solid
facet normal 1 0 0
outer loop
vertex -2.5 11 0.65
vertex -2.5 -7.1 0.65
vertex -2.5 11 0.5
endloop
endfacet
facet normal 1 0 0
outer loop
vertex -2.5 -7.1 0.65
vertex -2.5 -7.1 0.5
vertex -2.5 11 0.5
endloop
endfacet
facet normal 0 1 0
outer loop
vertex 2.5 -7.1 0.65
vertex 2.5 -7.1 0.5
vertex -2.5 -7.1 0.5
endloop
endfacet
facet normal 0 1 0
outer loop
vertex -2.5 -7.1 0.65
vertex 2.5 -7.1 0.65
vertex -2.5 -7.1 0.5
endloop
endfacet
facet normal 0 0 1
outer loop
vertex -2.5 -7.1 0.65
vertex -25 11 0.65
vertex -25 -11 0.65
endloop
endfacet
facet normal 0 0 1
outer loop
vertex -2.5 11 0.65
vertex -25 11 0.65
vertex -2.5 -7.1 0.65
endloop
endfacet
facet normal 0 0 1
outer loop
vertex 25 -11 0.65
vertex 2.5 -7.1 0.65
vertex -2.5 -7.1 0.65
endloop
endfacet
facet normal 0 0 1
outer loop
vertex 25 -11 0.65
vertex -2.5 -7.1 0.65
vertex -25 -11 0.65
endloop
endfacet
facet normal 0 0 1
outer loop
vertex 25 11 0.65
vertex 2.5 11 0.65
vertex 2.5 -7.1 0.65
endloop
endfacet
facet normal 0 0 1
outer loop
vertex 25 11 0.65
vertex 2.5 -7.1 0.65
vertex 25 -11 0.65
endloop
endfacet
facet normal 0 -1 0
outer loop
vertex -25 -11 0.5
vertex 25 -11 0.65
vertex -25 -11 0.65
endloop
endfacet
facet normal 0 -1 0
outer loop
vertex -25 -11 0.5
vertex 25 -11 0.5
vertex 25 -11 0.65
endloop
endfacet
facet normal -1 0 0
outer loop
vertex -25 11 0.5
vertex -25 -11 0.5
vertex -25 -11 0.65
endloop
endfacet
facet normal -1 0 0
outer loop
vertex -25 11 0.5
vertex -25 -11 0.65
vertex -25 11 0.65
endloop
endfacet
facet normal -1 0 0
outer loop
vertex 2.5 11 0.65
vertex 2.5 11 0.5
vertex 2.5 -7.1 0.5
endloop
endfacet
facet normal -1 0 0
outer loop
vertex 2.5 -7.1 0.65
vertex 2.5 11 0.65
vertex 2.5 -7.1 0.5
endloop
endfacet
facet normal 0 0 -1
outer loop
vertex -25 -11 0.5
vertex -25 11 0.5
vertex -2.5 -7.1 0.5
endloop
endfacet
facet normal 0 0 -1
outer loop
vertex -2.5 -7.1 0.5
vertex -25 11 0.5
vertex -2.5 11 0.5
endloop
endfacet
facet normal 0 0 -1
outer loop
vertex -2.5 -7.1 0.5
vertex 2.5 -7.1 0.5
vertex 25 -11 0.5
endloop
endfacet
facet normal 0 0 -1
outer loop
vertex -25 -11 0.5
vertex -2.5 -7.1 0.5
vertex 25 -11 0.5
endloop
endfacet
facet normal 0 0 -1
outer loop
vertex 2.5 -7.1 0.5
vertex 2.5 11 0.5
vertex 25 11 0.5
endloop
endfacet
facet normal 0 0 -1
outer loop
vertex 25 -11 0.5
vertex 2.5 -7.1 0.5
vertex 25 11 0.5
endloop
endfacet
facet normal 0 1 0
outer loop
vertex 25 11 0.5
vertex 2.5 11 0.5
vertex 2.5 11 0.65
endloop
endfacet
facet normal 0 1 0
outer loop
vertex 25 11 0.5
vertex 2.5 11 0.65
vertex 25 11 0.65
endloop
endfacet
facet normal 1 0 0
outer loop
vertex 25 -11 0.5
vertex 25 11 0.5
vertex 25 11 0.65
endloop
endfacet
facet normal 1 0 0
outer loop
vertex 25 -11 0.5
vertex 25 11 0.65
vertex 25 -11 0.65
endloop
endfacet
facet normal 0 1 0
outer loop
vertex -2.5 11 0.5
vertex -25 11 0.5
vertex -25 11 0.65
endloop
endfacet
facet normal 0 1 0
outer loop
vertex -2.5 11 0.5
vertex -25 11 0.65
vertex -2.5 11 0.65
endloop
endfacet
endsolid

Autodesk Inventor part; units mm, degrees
ref_plane "YZ Plane" through (0, 0, 0) normal (1, 0, 0) x (0, 1, 0)
ref_plane "XZ Plane" through (0, 0, 0) normal (0, 1, 0) x (-1, 0, 0)
ref_plane "XY Plane" through (0, 0, 0) normal (0, 0, 1) x (1, 0, 0)
ref_plane "Arbeitsebene1" through (0, 0, 0.5) normal (0, 0, 1) x (1, 0, 0)
sketch "Skizze1" plane through (0, 0, 0.5) normal (0, 0, 1) x (1, 0, 0)
  circle A0 centre (12, 2.9) radius 1.5 projected
  circle A1 centre (-12, 2.9) radius 1.5 projected
  line L0 (2.5, 12.9) -> (2.5, -7.1) projected
  line L1 (2.5, -7.1) -> (2.25, -7.1) projected
  line L2 (2.25, -7.1) -> (2, -7.1) projected
  line L3 (2, -7.1) -> (1.75, -7.1) projected
  line L4 (1.75, -7.1) -> (1.5, -7.1) projected
  line L5 (1.5, -7.1) -> (1.25, -7.1) projected
  line L6 (1.25, -7.1) -> (1, -7.1) projected
  line L7 (1, -7.1) -> (0.75, -7.1) projected
  line L8 (0.75, -7.1) -> (0.5, -7.1) projected
  line L9 (0.5, -7.1) -> (0.25, -7.1) projected
  line L10 (0.25, -7.1) -> (0, -7.1) projected
  line L11 (0, -7.1) -> (-0.25, -7.1) projected
  line L12 (-0.25, -7.1) -> (-0.5, -7.1) projected
  line L13 (-0.5, -7.1) -> (-0.75, -7.1) projected
  line L14 (-0.75, -7.1) -> (-1, -7.1) projected
  line L15 (-1, -7.1) -> (-1.25, -7.1) projected
  line L16 (-1.25, -7.1) -> (-1.5, -7.1) projected
  line L17 (-1.5, -7.1) -> (-1.75, -7.1) projected
  line L18 (-1.75, -7.1) -> (-2, -7.1) projected
  line L19 (-2, -7.1) -> (-2.25, -7.1) projected
  line L20 (-2.25, -7.1) -> (-2.5, -7.1) projected
  line L21 (-2.5, -7.1) -> (-2.5, 12.9) projected
  line L22 (-2.5, 12.9) -> (-38, 12.9) projected
  line L23 (-38, 12.9) -> (-38, -12.9) projected
  line L24 (-38, -12.9) -> (38, -12.9) projected
  line L25 (38, -12.9) -> (38, 12.9) projected
  line L26 (38, 12.9) -> (2.5, 12.9) projected
  line L27 (25, -11) -> (-25, -11)
  line L28 (-25, -11) -> (-25, 11)
  line L29 (-25, 11) -> (25, 11)
  line L30 (25, 11) -> (25, -11)
  line L31 (25, -11) -> (-25, 11) construction
  line L32 (-25, -11) -> (25, 11) construction
  point P0 (0, 0)
  point P1 (-2.5, 11)
  point P2 (2.5, 11)
  dimension "d0" = 50
  dimension "d1" = 22
extrude "Extrusion1" add sketch "Skizze1" along normal blind 0.15 contours A0 | A1 | L29 L30 L27 L28 L21 L20 L19 L18 L17 L16 L15 L14 L13 L12 L11 L10 L9 L8 L7 L6 L5 L4 L3 L2 L1 L0
properties part number "00_coverglass_50x22"
